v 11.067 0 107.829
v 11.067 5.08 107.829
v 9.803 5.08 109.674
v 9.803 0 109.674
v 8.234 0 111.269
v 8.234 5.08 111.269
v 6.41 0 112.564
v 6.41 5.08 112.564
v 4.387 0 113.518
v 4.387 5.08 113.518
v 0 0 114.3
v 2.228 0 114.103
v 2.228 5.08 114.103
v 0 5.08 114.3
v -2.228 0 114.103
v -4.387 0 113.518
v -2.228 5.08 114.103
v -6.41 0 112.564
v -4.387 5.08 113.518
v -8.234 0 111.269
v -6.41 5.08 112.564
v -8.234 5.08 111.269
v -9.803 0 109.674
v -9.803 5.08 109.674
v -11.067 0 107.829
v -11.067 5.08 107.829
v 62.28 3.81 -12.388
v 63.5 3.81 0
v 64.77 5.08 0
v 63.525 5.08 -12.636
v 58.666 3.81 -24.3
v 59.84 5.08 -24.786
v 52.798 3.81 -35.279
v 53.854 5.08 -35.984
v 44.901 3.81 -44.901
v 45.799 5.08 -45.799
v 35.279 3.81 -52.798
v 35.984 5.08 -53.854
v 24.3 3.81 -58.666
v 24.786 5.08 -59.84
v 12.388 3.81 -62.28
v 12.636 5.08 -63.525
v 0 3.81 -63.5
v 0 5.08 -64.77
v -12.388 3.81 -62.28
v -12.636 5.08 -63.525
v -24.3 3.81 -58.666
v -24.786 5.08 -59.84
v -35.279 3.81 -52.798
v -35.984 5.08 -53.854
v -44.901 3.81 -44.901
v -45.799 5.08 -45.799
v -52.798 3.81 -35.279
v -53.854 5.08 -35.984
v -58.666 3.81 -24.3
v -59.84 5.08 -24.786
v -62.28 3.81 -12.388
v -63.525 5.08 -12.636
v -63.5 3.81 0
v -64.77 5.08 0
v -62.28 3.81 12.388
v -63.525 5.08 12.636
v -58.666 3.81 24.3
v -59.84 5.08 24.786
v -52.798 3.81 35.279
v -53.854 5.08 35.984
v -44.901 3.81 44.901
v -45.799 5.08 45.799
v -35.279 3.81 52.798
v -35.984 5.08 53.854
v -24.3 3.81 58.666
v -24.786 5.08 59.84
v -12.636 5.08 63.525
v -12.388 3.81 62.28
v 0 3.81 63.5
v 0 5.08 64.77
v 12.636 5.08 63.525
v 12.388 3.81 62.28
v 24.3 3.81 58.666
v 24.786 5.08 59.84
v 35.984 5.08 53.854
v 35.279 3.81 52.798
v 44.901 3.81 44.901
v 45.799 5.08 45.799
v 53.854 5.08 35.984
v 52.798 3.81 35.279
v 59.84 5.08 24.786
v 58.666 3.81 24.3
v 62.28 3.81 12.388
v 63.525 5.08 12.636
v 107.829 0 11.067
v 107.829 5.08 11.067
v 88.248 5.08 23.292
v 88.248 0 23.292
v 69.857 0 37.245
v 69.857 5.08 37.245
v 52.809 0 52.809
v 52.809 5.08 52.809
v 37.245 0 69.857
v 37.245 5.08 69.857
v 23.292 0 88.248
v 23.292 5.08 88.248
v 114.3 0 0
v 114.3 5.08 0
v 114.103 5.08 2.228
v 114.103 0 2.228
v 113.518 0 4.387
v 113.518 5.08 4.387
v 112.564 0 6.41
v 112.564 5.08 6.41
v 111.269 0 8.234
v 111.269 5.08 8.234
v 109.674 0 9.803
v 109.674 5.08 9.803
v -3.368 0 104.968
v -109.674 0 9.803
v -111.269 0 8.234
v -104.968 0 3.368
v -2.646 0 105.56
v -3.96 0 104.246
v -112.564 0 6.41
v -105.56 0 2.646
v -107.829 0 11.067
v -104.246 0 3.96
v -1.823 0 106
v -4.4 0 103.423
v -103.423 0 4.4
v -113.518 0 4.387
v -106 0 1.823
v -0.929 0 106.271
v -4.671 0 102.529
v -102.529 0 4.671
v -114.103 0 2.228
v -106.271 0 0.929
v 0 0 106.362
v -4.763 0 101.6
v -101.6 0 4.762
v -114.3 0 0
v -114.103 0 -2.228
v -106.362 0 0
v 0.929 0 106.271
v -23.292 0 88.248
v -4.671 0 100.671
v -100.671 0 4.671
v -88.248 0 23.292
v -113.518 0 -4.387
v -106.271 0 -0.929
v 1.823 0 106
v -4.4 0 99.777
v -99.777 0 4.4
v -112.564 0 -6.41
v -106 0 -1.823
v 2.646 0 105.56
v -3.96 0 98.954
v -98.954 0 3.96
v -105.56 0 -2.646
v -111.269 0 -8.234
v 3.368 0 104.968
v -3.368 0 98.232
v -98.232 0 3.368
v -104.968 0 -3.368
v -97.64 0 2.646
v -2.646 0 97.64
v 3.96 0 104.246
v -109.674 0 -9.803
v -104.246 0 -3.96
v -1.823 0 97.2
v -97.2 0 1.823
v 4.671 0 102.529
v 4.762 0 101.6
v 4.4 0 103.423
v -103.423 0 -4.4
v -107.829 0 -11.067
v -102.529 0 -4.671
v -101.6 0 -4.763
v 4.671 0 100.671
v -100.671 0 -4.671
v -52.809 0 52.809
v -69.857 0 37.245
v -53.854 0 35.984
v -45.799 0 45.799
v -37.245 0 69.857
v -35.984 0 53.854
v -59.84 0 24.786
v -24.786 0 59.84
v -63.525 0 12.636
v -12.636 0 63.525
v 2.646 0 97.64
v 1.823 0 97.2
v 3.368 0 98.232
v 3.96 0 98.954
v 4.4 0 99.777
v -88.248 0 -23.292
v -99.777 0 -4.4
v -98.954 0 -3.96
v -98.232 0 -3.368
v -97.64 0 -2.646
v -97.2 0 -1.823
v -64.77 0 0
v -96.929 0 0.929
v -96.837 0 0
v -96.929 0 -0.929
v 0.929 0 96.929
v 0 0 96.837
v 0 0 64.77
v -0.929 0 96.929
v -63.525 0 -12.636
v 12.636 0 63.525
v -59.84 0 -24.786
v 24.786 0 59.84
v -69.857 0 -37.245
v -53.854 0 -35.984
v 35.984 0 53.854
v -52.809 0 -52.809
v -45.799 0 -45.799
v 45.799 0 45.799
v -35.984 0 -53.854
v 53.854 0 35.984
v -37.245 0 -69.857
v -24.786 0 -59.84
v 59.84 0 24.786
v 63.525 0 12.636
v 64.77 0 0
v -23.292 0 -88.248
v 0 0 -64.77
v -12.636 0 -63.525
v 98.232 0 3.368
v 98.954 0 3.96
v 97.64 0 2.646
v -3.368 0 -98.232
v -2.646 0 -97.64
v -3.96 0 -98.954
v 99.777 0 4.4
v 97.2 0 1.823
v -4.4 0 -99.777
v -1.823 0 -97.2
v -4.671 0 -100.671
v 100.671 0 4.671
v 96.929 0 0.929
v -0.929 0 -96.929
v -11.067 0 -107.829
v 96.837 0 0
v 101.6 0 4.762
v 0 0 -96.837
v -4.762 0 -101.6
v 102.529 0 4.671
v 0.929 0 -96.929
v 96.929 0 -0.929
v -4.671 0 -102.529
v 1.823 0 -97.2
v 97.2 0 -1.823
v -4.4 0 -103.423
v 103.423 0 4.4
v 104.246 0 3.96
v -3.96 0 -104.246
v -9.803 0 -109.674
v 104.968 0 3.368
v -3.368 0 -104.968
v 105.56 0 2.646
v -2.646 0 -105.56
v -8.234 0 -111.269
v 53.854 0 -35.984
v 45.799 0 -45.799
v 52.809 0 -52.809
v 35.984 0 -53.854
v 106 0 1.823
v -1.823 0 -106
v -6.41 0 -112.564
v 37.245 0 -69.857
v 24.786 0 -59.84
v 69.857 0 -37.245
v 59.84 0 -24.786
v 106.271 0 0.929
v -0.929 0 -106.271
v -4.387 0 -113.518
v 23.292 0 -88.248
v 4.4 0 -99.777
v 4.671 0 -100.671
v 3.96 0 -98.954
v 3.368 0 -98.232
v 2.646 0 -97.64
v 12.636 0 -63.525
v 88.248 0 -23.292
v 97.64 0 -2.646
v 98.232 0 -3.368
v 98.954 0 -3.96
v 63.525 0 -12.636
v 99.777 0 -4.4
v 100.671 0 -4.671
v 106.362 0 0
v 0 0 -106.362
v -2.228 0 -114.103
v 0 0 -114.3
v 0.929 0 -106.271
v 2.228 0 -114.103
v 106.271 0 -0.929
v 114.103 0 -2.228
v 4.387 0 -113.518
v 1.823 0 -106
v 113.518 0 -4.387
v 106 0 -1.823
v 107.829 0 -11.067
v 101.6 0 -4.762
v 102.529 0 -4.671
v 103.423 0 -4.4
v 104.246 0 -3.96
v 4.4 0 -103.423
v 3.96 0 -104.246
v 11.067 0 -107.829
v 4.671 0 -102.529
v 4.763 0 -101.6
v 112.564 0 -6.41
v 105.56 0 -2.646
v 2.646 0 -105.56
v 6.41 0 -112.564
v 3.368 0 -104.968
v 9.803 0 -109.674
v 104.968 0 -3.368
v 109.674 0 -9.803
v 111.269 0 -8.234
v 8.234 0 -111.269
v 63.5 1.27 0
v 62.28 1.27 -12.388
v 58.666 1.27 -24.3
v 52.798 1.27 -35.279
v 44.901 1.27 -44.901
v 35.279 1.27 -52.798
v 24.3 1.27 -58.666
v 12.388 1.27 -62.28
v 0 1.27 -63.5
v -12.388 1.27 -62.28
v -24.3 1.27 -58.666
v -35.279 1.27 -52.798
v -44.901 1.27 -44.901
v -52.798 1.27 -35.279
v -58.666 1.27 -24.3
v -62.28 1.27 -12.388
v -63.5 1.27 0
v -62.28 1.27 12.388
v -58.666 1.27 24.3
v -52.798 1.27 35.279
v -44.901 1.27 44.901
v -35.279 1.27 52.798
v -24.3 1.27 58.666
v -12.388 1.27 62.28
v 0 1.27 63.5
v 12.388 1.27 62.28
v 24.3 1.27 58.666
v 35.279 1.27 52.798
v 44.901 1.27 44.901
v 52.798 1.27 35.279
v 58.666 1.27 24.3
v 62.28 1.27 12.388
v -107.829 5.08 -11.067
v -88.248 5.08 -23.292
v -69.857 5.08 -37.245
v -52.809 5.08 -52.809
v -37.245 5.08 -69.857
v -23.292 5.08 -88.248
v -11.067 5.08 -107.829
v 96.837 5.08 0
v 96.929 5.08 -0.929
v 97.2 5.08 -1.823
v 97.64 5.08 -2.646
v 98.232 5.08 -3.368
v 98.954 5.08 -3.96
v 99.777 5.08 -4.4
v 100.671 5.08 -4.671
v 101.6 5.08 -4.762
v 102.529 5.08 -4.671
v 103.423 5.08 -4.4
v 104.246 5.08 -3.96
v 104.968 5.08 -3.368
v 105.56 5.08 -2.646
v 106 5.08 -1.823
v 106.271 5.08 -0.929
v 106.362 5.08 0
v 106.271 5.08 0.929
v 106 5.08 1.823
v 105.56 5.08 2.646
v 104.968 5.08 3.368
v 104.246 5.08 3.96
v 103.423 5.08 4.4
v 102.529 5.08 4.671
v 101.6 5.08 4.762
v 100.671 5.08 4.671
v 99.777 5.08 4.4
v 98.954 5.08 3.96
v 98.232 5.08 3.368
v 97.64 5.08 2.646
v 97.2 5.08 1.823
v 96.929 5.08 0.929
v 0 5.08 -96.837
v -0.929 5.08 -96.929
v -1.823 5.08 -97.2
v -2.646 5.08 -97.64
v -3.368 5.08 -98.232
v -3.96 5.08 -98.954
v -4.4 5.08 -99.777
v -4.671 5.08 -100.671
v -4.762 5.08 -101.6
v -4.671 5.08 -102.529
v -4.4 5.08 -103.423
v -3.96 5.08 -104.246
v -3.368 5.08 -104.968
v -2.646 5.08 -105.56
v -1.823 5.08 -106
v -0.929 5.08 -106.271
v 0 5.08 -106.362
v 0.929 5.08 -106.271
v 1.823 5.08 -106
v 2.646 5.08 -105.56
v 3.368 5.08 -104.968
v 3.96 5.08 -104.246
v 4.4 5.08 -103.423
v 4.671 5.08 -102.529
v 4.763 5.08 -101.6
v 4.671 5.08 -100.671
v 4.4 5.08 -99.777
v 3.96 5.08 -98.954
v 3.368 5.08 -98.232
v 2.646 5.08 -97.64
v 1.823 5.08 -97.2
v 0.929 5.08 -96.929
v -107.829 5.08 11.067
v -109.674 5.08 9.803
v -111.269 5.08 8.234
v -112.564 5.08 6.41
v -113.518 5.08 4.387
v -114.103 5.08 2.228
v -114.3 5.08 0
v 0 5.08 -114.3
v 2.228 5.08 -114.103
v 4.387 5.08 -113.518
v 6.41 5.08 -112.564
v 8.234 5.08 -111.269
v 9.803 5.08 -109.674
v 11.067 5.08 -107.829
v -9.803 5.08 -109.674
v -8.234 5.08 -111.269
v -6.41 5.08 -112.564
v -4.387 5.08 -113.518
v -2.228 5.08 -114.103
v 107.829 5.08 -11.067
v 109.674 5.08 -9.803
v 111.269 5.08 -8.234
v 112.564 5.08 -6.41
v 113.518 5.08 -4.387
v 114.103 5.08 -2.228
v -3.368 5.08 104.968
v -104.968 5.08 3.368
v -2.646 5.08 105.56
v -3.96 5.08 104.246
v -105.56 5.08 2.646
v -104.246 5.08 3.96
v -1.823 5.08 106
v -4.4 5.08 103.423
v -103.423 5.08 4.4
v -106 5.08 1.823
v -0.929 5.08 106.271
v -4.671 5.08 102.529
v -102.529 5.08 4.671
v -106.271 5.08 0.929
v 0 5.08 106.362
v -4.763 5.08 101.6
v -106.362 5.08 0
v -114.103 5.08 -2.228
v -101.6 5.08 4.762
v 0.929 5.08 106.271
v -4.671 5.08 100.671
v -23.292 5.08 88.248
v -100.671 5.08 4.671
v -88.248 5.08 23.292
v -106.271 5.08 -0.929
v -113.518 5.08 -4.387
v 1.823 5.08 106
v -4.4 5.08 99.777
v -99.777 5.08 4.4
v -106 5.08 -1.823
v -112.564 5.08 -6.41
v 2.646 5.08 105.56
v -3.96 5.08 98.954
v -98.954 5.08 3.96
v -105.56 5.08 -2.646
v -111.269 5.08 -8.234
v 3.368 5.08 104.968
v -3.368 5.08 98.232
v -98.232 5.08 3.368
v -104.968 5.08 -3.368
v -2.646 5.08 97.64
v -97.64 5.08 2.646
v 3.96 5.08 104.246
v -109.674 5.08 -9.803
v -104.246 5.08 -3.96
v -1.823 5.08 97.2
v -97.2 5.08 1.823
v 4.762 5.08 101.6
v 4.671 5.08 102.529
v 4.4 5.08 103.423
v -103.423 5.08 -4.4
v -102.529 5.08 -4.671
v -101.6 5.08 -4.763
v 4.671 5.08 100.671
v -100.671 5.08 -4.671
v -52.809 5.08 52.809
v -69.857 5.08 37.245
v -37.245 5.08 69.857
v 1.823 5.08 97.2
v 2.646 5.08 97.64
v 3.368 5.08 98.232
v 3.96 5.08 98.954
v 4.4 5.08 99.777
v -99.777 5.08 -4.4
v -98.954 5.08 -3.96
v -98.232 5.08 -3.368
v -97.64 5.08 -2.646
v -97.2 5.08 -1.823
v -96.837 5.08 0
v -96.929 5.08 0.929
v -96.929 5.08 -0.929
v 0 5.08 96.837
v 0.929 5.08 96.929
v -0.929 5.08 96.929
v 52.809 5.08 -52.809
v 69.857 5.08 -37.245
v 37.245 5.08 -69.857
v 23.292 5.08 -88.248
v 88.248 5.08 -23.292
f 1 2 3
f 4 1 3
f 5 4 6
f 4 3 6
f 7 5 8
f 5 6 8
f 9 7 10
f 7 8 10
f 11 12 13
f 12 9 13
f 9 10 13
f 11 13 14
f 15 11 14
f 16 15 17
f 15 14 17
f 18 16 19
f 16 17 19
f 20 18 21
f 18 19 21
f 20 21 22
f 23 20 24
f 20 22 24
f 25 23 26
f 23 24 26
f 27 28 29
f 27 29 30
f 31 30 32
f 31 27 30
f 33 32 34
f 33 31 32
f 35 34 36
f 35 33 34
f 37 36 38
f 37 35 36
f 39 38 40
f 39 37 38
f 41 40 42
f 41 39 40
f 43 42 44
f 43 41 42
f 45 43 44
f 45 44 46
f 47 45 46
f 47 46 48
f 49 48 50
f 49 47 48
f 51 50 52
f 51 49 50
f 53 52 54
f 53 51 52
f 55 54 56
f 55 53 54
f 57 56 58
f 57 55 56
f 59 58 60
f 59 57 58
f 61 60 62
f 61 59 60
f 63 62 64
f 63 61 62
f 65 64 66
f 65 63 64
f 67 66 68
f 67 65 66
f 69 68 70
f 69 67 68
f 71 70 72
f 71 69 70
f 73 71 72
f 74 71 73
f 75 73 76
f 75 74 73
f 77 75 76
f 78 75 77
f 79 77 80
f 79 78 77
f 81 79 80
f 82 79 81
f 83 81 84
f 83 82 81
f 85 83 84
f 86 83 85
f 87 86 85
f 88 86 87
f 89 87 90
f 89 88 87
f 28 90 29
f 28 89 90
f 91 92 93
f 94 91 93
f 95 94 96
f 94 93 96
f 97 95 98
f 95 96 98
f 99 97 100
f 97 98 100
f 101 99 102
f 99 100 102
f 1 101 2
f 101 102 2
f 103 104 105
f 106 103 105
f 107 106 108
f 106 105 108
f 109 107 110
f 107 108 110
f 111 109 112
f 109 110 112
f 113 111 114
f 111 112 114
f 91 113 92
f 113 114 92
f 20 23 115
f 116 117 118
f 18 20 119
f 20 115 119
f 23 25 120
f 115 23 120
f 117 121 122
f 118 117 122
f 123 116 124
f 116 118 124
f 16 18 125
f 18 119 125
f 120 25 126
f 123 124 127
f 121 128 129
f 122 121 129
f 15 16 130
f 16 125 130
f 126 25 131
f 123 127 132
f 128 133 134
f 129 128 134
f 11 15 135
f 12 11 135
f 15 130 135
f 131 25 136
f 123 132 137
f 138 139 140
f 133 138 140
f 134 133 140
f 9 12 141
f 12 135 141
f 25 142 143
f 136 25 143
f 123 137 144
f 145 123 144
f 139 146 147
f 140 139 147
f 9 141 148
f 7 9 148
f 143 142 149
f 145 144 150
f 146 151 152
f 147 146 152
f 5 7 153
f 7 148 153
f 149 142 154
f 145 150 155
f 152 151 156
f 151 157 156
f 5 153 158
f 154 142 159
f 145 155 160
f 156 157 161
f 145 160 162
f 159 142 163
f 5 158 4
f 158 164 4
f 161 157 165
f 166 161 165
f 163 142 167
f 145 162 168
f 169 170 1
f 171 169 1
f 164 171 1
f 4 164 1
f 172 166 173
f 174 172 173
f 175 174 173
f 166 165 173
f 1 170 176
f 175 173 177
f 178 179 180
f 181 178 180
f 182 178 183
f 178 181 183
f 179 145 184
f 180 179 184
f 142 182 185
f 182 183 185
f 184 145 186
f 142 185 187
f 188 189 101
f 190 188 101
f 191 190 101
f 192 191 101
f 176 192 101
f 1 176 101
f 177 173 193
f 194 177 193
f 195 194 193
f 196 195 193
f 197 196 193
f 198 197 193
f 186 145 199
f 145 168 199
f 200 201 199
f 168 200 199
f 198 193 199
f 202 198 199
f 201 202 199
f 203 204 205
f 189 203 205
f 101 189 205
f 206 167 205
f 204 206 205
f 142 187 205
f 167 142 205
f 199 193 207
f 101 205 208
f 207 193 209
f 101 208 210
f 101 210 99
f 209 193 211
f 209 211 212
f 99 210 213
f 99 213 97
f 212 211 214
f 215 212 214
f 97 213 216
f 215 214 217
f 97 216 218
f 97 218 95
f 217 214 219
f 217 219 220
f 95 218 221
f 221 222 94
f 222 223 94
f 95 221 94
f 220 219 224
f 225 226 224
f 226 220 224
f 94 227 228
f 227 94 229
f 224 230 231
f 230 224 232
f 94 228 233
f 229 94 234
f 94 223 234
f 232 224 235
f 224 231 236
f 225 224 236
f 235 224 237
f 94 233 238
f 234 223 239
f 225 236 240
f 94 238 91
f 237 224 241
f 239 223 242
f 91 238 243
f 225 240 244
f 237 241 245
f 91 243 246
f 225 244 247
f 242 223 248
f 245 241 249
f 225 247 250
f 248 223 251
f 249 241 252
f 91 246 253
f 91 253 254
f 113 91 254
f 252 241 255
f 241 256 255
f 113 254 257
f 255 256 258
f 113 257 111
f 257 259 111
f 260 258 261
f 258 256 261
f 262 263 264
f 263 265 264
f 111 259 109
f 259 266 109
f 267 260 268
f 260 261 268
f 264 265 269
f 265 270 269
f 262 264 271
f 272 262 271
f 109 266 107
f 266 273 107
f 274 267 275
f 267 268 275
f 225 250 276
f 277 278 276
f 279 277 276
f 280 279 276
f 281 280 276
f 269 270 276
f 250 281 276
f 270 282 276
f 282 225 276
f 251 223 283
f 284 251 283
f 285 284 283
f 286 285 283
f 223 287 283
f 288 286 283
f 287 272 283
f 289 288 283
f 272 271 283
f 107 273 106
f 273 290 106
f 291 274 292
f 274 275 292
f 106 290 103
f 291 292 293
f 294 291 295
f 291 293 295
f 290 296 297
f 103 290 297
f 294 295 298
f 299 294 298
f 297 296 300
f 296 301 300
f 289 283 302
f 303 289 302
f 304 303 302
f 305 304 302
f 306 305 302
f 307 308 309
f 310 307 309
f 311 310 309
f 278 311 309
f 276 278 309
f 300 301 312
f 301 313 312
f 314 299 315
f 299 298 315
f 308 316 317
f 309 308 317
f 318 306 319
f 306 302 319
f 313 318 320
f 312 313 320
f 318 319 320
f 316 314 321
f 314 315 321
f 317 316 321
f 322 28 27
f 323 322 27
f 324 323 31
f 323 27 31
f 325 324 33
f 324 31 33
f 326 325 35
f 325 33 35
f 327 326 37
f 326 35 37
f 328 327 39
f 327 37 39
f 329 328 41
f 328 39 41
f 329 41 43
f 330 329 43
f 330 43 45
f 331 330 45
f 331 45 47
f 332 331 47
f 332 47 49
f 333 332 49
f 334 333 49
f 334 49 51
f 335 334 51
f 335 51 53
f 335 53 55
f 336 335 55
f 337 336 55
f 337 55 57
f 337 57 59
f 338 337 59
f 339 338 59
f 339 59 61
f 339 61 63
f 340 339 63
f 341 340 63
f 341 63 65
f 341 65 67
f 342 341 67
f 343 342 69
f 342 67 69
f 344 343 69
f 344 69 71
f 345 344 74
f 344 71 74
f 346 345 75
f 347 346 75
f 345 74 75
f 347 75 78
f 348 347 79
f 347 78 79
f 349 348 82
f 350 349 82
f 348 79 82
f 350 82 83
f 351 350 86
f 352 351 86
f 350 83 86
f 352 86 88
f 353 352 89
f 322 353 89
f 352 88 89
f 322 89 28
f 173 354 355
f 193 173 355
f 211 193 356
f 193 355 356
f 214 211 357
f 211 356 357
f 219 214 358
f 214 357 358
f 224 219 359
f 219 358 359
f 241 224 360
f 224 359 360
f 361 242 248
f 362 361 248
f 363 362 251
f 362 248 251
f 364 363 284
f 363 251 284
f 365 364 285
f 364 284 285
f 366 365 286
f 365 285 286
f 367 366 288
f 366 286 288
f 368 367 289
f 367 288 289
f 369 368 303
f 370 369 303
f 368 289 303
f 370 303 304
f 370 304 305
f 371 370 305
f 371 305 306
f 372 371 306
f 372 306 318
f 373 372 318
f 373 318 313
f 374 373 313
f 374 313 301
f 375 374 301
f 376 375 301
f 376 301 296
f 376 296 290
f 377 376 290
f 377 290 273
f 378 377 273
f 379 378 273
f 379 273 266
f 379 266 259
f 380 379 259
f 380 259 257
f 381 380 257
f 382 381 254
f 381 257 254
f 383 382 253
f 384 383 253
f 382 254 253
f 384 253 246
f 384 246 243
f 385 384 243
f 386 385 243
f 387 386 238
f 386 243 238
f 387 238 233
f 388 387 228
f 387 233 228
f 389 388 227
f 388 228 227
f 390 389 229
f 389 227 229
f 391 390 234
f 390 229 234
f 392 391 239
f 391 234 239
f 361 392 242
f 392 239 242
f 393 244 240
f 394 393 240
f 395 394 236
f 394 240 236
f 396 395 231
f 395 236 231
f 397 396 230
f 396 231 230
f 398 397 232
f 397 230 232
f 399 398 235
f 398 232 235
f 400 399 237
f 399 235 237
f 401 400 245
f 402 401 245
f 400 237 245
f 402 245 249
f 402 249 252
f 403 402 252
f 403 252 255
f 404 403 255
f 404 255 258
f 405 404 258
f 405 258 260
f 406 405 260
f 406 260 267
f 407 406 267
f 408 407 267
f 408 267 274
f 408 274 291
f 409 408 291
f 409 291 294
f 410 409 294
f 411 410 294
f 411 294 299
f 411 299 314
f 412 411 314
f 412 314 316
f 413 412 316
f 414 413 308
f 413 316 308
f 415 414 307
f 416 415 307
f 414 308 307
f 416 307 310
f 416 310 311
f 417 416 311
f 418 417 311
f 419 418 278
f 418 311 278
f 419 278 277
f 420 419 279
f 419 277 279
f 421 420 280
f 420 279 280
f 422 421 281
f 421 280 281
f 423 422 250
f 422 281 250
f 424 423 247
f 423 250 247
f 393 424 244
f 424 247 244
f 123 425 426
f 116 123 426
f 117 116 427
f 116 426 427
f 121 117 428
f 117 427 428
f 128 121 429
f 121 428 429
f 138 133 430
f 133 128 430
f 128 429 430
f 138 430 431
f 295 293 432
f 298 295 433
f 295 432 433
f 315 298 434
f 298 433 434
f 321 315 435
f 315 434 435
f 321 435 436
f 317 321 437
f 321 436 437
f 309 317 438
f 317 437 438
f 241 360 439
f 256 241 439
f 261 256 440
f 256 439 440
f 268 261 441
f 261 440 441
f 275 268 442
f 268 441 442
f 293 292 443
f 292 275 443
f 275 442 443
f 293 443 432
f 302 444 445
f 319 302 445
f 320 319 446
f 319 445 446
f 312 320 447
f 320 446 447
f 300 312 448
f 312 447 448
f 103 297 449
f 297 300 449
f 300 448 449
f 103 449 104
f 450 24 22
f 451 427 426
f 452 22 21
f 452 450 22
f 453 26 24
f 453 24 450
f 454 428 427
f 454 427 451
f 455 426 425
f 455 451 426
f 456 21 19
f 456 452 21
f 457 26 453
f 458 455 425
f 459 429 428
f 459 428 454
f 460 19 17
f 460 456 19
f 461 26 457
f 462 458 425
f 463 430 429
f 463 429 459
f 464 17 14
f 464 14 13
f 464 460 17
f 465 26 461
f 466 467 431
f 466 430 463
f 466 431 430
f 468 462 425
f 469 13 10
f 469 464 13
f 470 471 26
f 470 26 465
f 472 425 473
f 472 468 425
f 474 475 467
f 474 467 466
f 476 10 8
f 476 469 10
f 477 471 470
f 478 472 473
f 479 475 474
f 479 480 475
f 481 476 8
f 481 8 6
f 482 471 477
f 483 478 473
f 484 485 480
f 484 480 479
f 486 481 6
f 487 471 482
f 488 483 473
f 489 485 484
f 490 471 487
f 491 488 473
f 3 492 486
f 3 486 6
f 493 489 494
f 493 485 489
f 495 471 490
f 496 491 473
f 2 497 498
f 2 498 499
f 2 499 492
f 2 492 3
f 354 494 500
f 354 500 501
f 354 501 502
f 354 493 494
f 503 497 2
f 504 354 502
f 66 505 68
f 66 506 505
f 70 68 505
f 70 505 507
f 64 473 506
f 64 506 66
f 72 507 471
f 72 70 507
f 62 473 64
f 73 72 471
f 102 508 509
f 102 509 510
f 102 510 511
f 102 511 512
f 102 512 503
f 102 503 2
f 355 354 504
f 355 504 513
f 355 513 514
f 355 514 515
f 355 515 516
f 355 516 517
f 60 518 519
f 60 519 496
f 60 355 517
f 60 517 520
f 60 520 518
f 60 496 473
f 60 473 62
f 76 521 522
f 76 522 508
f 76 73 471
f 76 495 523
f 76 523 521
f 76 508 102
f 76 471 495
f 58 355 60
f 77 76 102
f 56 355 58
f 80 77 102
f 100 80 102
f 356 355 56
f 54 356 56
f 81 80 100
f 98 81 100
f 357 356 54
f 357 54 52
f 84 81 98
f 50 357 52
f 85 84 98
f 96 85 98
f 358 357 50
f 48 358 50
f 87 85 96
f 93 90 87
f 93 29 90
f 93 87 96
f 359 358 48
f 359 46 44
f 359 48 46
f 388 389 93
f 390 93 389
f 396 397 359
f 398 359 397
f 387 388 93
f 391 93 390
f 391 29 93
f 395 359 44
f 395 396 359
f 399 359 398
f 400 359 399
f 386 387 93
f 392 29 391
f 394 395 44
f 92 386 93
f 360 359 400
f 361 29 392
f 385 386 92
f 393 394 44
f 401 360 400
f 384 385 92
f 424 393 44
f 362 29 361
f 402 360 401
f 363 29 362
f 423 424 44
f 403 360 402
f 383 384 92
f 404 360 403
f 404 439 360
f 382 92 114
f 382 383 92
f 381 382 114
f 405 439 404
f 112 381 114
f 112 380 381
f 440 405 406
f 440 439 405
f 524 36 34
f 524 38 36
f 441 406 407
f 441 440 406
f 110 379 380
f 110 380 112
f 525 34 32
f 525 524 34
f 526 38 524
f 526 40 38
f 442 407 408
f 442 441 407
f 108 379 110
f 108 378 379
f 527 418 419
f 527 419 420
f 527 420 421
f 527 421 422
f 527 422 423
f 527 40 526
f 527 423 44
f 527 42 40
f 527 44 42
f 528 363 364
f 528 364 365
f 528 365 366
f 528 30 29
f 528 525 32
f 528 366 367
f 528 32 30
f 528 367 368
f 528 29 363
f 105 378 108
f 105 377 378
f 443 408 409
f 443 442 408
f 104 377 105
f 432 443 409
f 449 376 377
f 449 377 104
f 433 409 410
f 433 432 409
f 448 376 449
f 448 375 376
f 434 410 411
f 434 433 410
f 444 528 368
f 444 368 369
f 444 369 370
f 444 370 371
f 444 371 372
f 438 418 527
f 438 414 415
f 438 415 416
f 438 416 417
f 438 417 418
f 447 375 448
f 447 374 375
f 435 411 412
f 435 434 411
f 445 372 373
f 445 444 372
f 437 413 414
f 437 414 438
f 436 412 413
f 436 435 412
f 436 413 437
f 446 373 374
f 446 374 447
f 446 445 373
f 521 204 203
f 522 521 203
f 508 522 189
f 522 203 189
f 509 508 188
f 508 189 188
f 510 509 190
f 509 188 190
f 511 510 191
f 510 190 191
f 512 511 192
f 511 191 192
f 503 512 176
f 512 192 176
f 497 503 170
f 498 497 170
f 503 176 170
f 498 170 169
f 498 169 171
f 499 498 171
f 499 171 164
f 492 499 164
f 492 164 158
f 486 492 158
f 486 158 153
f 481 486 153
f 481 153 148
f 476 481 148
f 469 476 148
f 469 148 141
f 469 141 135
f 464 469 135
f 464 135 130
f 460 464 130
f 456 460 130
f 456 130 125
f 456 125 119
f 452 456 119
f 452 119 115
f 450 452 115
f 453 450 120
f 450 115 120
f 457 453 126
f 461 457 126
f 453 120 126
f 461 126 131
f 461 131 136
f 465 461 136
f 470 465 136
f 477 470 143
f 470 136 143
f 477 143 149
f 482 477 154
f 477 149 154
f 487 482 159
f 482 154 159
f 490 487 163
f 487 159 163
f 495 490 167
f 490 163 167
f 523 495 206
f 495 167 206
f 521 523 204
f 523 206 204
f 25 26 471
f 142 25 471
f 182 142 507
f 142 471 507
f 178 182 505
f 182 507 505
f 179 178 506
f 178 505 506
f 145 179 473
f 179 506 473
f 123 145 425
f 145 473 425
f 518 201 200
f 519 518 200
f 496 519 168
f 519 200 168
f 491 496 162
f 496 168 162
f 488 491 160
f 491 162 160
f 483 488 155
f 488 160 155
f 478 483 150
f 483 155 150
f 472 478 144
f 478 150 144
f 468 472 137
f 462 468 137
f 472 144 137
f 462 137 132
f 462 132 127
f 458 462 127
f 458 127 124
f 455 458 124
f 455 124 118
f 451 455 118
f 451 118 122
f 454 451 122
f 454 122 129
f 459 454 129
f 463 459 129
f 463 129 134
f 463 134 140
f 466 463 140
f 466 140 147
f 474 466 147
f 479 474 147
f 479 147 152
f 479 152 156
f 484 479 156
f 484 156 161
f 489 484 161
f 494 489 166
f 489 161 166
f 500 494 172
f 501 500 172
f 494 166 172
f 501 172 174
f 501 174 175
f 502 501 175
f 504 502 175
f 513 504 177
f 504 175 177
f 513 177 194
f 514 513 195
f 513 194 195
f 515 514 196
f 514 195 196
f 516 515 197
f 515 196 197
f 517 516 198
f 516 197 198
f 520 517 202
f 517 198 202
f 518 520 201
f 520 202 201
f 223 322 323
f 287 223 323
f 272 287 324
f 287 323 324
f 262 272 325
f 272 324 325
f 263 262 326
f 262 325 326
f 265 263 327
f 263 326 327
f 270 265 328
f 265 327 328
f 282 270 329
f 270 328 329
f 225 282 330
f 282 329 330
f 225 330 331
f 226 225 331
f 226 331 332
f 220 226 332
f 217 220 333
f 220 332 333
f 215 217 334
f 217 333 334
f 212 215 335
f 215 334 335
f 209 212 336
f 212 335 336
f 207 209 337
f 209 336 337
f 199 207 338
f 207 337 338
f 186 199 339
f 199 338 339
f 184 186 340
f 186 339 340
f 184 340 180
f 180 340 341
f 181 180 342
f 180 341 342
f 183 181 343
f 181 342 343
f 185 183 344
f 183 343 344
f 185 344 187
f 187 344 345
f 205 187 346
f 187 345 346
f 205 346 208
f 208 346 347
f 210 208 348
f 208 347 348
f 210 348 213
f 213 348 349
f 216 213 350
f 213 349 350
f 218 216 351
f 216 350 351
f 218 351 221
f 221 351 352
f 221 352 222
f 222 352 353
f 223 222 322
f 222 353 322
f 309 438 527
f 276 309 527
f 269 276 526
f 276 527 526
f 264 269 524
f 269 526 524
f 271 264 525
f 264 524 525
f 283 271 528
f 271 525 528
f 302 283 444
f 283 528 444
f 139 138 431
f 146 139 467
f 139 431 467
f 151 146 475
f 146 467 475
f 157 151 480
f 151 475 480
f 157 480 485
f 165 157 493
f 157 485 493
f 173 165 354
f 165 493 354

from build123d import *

# Parameters (mm, degrees)
SKETCH1_W                        = 228.6
SKETCH1_H                        = 228.6
BOSS_EXTRUDE1_DEPTH              = 5.08
SKETCH2_R                        = 63.5
CUT_EXTRUDE1_DEPTH               = 6.08
CUT_EXTRUDE2_DEPTH               = 6.08
CIRPATTERN1_COUNT                = 4
F_3_8_0_375_DIAMETER_HOLE1_D     = 9.525
F_3_8_0_375_DIAMETER_HOLE1_DEPTH = 5.081
CIRPATTERN2_COUNT                = 4
CHAMFER1_SIZE                    = 1.27


with BuildPart() as part:
    # Sketch1 → Boss-Extrude1 (new body)
    with BuildSketch(Plane(origin=(0, 0, 0), x_dir=(1, 0, 0), z_dir=(0, 1, 0))):
        Rectangle(SKETCH1_W, SKETCH1_H)
    extrude(amount=BOSS_EXTRUDE1_DEPTH)

    # Sketch2 → Cut-Extrude1 (cut, through all)
    with BuildSketch(Plane(origin=(0, 5.08, 0), x_dir=(1, 0, 0), z_dir=(0, 1, 0))):
        Circle(SKETCH2_R)
    extrude(amount=-CUT_EXTRUDE1_DEPTH, mode=Mode.SUBTRACT)

    # Sketch3 → Cut-Extrude2 (cut, through all)
    with BuildSketch(Plane(origin=(0, 5.08, 0), x_dir=(1, 0, 0), z_dir=(0, 1, 0))):
        with BuildLine():
            Line((114.3, 114.3), (0, 114.3))
            ThreePointArc((0, 114.3), (6.410086185, 112.56361232), (11.06735431, 107.829259072))
            ThreePointArc((11.06735431, 107.829259072), (52.809318084, 52.809318084), (107.829259072, 11.06735431))
            ThreePointArc((107.829259072, 11.06735431), (112.56361232, 6.410086185), (114.3, 0))
            Line((114.3, 0), (114.3, 114.3))
        make_face()
    cut_extrude2 = extrude(amount=-CUT_EXTRUDE2_DEPTH, mode=Mode.SUBTRACT)

    # CirPattern1: Cut-Extrude2 ×4 about axis
    cirpattern1_axis = Axis((0, 0, 0), (0, 1, 0))
    for i in range(1, CIRPATTERN1_COUNT):
        add(cut_extrude2.rotate(cirpattern1_axis, i * 360 / CIRPATTERN1_COUNT), mode=Mode.SUBTRACT)

    # 3/8 (0.375) Diameter Hole1
    with Locations(Plane(origin=(0, 5.08, 0), x_dir=(1, 0, 0), z_dir=(0, 1, 0))):
        with Locations((101.6, 0)):
            f_3_8_0_375_diameter_hole1 = Hole(F_3_8_0_375_DIAMETER_HOLE1_D / 2, depth=F_3_8_0_375_DIAMETER_HOLE1_DEPTH)

    # CirPattern2: 3/8 (0.375) Diameter Hole1 ×4 about axis
    cirpattern2_axis = Axis((0, 0, 0), (0, 1, 0))
    for i in range(1, CIRPATTERN2_COUNT):
        add(f_3_8_0_375_diameter_hole1.rotate(cirpattern2_axis, i * 360 / CIRPATTERN2_COUNT), mode=Mode.SUBTRACT)

    # Chamfer1
    chamfer1_edges = [part.edges().sort_by_distance(p)[0] for p in [
        (-63.5, 0, 0),
        (-63.5, 5.08, 0),
    ]]
    chamfer(chamfer1_edges, length=CHAMFER1_SIZE)


solid = part.part
